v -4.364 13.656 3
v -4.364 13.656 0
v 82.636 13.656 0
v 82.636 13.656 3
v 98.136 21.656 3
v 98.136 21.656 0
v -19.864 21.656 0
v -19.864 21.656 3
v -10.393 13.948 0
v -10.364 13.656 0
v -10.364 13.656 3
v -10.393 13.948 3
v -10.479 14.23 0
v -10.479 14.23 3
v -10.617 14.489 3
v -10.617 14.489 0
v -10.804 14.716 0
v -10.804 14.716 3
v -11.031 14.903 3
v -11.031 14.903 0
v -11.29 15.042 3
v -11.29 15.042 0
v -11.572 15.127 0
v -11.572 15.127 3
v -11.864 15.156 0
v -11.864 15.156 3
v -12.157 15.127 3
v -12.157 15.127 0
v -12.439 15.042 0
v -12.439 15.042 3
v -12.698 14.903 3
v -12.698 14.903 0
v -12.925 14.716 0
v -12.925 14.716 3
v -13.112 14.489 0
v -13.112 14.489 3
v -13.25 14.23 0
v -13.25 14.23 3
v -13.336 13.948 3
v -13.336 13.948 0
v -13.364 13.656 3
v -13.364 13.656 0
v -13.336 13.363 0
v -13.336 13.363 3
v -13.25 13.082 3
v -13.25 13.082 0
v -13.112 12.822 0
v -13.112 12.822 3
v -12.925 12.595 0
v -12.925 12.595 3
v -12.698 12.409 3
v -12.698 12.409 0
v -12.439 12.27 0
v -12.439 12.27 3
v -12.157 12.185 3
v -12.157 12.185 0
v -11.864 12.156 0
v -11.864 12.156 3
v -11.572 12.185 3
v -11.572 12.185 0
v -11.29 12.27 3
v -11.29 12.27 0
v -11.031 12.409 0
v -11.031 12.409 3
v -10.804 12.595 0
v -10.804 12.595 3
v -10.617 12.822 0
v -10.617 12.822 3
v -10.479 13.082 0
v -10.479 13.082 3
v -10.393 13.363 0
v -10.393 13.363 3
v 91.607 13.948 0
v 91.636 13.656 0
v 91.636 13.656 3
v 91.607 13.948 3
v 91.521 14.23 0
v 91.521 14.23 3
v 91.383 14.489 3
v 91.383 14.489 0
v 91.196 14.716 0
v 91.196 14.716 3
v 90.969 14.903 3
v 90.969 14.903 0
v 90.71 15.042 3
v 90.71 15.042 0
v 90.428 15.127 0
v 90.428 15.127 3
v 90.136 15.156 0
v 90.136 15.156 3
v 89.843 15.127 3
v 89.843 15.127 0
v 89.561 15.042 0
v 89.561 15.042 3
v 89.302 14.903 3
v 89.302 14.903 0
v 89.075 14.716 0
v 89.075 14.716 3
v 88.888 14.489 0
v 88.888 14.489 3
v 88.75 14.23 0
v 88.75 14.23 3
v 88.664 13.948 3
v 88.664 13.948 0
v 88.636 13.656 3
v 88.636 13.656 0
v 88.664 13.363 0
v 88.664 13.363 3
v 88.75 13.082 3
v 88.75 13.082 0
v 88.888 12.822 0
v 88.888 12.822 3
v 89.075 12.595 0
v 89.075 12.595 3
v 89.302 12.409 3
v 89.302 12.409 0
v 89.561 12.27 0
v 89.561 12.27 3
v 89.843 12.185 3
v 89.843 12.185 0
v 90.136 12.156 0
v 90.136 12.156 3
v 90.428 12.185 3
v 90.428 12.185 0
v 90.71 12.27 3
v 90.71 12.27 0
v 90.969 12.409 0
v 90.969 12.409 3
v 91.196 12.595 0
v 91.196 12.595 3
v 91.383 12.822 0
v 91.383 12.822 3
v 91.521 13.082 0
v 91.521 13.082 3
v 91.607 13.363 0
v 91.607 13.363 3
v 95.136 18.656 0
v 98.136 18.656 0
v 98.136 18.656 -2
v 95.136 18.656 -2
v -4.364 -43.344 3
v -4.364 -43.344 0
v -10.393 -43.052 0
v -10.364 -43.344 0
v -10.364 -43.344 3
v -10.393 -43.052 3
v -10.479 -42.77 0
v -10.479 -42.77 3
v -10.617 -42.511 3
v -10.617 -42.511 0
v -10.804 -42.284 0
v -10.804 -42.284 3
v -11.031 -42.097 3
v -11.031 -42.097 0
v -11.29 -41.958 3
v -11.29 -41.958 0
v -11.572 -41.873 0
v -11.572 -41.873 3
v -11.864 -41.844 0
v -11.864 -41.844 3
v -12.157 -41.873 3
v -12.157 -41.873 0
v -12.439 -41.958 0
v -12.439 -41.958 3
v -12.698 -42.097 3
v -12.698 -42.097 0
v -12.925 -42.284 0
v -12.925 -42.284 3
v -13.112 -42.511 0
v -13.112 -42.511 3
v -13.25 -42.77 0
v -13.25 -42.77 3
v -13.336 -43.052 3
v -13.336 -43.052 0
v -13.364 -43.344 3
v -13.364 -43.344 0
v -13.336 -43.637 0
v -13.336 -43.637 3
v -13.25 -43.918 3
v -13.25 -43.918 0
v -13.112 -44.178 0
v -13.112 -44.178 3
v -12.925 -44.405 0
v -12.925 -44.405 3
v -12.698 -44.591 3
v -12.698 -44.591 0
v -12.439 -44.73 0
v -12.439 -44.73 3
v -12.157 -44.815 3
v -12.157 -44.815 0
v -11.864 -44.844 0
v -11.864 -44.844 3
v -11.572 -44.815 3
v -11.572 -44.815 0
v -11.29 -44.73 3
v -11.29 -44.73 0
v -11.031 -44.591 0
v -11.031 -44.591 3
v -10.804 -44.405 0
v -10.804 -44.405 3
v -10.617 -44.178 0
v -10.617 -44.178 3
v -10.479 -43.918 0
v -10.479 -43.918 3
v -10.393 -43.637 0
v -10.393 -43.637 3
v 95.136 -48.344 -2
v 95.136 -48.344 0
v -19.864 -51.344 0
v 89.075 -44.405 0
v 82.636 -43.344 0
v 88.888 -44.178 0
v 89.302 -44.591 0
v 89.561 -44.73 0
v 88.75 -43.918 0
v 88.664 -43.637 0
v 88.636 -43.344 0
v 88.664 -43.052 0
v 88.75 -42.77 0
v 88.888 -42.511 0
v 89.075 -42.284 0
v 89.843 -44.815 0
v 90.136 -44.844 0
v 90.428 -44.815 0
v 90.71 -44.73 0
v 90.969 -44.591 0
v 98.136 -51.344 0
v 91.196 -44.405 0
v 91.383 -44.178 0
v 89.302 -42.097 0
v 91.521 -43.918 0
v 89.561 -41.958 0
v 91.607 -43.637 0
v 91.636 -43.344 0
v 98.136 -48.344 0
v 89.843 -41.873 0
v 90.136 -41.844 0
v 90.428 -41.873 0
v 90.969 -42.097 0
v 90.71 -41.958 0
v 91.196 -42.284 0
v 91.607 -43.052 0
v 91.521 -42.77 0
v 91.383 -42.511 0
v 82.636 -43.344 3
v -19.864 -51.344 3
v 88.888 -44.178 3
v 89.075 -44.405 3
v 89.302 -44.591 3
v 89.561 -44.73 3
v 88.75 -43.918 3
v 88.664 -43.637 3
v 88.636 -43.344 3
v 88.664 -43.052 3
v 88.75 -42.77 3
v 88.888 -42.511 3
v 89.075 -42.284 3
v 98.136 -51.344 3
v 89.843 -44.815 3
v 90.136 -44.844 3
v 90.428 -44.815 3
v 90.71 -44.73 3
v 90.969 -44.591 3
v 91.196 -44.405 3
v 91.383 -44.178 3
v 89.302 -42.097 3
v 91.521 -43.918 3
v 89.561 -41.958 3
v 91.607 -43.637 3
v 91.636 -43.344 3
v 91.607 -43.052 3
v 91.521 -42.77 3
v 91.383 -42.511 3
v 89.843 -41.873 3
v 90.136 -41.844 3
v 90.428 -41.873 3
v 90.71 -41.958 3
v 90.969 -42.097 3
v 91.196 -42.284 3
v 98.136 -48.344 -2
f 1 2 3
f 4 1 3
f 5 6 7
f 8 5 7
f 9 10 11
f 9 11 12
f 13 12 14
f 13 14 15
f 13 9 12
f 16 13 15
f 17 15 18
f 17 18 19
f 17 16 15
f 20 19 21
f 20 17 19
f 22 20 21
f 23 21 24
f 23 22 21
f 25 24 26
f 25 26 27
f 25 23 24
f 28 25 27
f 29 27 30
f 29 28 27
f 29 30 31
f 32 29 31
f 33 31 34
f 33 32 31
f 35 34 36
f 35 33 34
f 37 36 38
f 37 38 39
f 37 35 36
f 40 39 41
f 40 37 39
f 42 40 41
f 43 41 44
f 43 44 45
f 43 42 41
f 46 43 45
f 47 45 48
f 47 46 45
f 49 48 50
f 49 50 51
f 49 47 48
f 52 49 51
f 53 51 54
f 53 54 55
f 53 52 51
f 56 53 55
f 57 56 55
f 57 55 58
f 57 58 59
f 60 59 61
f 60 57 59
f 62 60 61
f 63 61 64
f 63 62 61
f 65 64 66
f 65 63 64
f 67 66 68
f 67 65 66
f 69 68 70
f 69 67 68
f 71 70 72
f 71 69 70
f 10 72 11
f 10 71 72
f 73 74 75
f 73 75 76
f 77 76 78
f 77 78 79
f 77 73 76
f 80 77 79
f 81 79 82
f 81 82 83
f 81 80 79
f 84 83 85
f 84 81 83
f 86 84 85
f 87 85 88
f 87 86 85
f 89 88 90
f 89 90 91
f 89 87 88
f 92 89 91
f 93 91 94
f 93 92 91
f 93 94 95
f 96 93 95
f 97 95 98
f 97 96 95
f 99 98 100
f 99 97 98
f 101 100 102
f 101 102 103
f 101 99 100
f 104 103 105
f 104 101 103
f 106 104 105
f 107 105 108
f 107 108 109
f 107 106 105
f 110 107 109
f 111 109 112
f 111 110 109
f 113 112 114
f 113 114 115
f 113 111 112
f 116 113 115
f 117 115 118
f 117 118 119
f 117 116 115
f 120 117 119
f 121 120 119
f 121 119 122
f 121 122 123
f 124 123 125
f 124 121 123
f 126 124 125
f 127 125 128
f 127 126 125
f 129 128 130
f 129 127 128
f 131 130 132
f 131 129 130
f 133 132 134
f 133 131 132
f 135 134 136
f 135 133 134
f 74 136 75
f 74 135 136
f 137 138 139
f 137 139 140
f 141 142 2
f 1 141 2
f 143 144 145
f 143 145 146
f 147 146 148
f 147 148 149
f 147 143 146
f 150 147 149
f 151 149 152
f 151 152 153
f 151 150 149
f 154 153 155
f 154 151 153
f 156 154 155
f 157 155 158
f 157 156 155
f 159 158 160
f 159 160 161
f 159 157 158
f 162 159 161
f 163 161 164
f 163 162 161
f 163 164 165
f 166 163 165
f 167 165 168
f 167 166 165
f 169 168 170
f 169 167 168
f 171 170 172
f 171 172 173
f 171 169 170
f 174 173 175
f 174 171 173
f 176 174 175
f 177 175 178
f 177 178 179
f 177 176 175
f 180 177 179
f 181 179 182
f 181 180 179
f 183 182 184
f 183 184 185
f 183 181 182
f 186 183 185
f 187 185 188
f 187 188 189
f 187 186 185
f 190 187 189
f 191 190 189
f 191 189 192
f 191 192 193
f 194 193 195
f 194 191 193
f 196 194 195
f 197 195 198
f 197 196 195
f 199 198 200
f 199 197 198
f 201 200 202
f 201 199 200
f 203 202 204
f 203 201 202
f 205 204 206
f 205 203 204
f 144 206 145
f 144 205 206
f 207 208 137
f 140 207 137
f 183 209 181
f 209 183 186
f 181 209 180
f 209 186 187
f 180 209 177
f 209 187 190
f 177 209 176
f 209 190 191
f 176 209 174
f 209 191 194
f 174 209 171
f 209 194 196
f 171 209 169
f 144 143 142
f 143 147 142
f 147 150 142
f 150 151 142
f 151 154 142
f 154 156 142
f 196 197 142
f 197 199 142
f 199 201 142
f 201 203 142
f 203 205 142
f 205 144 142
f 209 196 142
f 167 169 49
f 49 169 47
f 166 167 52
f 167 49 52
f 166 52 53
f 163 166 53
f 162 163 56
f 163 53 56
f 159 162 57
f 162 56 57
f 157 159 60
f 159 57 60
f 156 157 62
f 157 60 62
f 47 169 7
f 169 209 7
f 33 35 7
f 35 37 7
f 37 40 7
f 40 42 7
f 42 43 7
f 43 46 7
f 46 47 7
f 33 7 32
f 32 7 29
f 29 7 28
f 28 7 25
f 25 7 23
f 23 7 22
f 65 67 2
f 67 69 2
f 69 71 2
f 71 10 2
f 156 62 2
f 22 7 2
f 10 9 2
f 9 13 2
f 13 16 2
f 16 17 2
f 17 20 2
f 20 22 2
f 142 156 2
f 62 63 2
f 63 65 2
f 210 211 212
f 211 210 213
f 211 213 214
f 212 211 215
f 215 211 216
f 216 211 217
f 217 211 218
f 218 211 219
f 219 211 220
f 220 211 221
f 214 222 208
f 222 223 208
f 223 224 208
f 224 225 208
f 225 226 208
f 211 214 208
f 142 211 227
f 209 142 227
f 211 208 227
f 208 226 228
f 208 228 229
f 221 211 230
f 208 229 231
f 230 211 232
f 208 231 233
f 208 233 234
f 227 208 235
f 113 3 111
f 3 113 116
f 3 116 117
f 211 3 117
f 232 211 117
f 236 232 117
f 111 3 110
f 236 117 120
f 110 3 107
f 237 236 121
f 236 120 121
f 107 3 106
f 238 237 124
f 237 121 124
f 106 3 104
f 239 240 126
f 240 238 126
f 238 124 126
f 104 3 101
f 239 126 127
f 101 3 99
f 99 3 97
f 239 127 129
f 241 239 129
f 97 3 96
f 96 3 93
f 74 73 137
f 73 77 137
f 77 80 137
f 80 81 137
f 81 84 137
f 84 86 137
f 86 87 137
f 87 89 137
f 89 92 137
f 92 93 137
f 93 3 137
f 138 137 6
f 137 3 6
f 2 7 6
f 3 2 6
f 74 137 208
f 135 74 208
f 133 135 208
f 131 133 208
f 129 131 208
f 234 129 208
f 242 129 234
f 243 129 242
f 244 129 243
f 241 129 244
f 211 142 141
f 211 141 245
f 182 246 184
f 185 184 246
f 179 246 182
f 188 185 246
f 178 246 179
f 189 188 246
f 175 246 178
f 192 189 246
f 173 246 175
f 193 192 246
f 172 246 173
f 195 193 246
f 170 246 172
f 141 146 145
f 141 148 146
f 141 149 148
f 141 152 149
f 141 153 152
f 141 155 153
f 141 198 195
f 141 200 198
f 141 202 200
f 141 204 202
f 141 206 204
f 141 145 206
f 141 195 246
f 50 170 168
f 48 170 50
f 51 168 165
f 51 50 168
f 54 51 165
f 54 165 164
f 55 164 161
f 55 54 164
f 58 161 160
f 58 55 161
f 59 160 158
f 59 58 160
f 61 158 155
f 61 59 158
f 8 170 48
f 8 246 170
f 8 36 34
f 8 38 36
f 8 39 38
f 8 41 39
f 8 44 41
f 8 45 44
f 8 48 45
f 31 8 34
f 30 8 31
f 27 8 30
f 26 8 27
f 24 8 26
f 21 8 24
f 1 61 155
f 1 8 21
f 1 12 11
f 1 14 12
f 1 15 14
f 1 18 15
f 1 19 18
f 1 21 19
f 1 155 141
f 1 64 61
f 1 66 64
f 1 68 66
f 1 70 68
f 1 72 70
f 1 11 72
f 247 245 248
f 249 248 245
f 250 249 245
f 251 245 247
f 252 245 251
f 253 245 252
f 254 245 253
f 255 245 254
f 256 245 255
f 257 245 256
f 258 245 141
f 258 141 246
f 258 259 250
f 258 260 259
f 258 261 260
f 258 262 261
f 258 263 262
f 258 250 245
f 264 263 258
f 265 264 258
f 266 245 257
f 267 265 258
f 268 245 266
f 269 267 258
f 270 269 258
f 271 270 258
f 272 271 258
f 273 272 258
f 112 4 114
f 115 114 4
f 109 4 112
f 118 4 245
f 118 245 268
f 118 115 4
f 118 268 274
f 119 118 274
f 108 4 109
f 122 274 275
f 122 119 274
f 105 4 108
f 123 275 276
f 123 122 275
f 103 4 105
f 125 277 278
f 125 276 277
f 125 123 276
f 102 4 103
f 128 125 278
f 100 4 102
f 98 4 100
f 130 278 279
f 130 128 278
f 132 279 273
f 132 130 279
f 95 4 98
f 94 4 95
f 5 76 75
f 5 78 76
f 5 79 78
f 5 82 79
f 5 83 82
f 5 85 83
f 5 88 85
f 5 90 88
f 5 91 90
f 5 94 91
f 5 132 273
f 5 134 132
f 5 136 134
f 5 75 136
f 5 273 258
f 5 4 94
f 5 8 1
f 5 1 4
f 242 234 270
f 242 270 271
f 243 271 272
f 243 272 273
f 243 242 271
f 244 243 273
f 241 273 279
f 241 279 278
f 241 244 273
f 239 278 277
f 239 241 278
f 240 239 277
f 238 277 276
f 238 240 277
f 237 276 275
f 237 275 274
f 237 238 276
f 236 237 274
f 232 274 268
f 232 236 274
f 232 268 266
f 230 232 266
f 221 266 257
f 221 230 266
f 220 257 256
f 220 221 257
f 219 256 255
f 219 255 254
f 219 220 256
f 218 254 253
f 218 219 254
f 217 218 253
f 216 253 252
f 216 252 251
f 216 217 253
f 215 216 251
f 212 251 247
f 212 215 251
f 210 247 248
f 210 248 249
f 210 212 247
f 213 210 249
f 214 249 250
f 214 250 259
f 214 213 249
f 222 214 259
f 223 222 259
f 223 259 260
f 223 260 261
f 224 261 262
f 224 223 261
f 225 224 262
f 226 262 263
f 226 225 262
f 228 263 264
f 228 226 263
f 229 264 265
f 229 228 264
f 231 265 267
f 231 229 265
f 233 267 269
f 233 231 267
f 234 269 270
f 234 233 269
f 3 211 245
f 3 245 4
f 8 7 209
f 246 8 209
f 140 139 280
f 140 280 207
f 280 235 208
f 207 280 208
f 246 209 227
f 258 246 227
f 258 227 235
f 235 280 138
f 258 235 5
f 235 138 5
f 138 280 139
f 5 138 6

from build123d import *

# Parameters (mm, degrees)
SKETCH_1_R      = 1.5
SKETCH_1_W      = 87
SKETCH_1_H      = 57
EXTRUDE_2_DEPTH = 3
SKETCH_3_W      = 3
SKETCH_3_H      = 67
EXTRUDE_3_DEPTH = 2


with BuildPart() as part:
    # 草图1 → 凸台-拉伸2 (new body)
    with BuildSketch(Plane.XY):
        Polygon((-11.864484676, 21.655738596), (-19.864484676, 21.655738596), (-19.864484676, 10.655738596), (-19.864484676, -51.344261404), (-14.864484676, -51.344261404), (-11.864484676, -51.344261404), (98.135515324, -51.344261404), (98.135515324, -43.344261404), (98.135515324, 10.655738596), (98.135515324, 21.655738596), (-4.364484676, 21.655738596), (-6.864484676, 21.655738596), (-7.364484676, 21.655738596), align=None)
        with Locations((-11.864484676, -43.344261404)):
            Circle(SKETCH_1_R, mode=Mode.SUBTRACT)
        with Locations((90.135515324, -43.344261404)):
            Circle(SKETCH_1_R, mode=Mode.SUBTRACT)
        with Locations((-11.864484676, 13.655738596)):
            Circle(SKETCH_1_R, mode=Mode.SUBTRACT)
        with Locations((39.135515324, -14.844261404)):
            Rectangle(SKETCH_1_W, SKETCH_1_H, mode=Mode.SUBTRACT)
        with Locations((90.135515324, 13.655738596)):
            Circle(SKETCH_1_R, mode=Mode.SUBTRACT)
    extrude(amount=EXTRUDE_2_DEPTH)

    # 草图3 → 凸台-拉伸3 (add)
    with BuildSketch(Plane(origin=(0, 0, 0), x_dir=(-1, 0, 0), z_dir=(0, 0, -1))):
        with Locations((-96.635515324, -14.844261404)):
            Rectangle(SKETCH_3_W, SKETCH_3_H)
    extrude(amount=EXTRUDE_3_DEPTH)


solid = part.part
